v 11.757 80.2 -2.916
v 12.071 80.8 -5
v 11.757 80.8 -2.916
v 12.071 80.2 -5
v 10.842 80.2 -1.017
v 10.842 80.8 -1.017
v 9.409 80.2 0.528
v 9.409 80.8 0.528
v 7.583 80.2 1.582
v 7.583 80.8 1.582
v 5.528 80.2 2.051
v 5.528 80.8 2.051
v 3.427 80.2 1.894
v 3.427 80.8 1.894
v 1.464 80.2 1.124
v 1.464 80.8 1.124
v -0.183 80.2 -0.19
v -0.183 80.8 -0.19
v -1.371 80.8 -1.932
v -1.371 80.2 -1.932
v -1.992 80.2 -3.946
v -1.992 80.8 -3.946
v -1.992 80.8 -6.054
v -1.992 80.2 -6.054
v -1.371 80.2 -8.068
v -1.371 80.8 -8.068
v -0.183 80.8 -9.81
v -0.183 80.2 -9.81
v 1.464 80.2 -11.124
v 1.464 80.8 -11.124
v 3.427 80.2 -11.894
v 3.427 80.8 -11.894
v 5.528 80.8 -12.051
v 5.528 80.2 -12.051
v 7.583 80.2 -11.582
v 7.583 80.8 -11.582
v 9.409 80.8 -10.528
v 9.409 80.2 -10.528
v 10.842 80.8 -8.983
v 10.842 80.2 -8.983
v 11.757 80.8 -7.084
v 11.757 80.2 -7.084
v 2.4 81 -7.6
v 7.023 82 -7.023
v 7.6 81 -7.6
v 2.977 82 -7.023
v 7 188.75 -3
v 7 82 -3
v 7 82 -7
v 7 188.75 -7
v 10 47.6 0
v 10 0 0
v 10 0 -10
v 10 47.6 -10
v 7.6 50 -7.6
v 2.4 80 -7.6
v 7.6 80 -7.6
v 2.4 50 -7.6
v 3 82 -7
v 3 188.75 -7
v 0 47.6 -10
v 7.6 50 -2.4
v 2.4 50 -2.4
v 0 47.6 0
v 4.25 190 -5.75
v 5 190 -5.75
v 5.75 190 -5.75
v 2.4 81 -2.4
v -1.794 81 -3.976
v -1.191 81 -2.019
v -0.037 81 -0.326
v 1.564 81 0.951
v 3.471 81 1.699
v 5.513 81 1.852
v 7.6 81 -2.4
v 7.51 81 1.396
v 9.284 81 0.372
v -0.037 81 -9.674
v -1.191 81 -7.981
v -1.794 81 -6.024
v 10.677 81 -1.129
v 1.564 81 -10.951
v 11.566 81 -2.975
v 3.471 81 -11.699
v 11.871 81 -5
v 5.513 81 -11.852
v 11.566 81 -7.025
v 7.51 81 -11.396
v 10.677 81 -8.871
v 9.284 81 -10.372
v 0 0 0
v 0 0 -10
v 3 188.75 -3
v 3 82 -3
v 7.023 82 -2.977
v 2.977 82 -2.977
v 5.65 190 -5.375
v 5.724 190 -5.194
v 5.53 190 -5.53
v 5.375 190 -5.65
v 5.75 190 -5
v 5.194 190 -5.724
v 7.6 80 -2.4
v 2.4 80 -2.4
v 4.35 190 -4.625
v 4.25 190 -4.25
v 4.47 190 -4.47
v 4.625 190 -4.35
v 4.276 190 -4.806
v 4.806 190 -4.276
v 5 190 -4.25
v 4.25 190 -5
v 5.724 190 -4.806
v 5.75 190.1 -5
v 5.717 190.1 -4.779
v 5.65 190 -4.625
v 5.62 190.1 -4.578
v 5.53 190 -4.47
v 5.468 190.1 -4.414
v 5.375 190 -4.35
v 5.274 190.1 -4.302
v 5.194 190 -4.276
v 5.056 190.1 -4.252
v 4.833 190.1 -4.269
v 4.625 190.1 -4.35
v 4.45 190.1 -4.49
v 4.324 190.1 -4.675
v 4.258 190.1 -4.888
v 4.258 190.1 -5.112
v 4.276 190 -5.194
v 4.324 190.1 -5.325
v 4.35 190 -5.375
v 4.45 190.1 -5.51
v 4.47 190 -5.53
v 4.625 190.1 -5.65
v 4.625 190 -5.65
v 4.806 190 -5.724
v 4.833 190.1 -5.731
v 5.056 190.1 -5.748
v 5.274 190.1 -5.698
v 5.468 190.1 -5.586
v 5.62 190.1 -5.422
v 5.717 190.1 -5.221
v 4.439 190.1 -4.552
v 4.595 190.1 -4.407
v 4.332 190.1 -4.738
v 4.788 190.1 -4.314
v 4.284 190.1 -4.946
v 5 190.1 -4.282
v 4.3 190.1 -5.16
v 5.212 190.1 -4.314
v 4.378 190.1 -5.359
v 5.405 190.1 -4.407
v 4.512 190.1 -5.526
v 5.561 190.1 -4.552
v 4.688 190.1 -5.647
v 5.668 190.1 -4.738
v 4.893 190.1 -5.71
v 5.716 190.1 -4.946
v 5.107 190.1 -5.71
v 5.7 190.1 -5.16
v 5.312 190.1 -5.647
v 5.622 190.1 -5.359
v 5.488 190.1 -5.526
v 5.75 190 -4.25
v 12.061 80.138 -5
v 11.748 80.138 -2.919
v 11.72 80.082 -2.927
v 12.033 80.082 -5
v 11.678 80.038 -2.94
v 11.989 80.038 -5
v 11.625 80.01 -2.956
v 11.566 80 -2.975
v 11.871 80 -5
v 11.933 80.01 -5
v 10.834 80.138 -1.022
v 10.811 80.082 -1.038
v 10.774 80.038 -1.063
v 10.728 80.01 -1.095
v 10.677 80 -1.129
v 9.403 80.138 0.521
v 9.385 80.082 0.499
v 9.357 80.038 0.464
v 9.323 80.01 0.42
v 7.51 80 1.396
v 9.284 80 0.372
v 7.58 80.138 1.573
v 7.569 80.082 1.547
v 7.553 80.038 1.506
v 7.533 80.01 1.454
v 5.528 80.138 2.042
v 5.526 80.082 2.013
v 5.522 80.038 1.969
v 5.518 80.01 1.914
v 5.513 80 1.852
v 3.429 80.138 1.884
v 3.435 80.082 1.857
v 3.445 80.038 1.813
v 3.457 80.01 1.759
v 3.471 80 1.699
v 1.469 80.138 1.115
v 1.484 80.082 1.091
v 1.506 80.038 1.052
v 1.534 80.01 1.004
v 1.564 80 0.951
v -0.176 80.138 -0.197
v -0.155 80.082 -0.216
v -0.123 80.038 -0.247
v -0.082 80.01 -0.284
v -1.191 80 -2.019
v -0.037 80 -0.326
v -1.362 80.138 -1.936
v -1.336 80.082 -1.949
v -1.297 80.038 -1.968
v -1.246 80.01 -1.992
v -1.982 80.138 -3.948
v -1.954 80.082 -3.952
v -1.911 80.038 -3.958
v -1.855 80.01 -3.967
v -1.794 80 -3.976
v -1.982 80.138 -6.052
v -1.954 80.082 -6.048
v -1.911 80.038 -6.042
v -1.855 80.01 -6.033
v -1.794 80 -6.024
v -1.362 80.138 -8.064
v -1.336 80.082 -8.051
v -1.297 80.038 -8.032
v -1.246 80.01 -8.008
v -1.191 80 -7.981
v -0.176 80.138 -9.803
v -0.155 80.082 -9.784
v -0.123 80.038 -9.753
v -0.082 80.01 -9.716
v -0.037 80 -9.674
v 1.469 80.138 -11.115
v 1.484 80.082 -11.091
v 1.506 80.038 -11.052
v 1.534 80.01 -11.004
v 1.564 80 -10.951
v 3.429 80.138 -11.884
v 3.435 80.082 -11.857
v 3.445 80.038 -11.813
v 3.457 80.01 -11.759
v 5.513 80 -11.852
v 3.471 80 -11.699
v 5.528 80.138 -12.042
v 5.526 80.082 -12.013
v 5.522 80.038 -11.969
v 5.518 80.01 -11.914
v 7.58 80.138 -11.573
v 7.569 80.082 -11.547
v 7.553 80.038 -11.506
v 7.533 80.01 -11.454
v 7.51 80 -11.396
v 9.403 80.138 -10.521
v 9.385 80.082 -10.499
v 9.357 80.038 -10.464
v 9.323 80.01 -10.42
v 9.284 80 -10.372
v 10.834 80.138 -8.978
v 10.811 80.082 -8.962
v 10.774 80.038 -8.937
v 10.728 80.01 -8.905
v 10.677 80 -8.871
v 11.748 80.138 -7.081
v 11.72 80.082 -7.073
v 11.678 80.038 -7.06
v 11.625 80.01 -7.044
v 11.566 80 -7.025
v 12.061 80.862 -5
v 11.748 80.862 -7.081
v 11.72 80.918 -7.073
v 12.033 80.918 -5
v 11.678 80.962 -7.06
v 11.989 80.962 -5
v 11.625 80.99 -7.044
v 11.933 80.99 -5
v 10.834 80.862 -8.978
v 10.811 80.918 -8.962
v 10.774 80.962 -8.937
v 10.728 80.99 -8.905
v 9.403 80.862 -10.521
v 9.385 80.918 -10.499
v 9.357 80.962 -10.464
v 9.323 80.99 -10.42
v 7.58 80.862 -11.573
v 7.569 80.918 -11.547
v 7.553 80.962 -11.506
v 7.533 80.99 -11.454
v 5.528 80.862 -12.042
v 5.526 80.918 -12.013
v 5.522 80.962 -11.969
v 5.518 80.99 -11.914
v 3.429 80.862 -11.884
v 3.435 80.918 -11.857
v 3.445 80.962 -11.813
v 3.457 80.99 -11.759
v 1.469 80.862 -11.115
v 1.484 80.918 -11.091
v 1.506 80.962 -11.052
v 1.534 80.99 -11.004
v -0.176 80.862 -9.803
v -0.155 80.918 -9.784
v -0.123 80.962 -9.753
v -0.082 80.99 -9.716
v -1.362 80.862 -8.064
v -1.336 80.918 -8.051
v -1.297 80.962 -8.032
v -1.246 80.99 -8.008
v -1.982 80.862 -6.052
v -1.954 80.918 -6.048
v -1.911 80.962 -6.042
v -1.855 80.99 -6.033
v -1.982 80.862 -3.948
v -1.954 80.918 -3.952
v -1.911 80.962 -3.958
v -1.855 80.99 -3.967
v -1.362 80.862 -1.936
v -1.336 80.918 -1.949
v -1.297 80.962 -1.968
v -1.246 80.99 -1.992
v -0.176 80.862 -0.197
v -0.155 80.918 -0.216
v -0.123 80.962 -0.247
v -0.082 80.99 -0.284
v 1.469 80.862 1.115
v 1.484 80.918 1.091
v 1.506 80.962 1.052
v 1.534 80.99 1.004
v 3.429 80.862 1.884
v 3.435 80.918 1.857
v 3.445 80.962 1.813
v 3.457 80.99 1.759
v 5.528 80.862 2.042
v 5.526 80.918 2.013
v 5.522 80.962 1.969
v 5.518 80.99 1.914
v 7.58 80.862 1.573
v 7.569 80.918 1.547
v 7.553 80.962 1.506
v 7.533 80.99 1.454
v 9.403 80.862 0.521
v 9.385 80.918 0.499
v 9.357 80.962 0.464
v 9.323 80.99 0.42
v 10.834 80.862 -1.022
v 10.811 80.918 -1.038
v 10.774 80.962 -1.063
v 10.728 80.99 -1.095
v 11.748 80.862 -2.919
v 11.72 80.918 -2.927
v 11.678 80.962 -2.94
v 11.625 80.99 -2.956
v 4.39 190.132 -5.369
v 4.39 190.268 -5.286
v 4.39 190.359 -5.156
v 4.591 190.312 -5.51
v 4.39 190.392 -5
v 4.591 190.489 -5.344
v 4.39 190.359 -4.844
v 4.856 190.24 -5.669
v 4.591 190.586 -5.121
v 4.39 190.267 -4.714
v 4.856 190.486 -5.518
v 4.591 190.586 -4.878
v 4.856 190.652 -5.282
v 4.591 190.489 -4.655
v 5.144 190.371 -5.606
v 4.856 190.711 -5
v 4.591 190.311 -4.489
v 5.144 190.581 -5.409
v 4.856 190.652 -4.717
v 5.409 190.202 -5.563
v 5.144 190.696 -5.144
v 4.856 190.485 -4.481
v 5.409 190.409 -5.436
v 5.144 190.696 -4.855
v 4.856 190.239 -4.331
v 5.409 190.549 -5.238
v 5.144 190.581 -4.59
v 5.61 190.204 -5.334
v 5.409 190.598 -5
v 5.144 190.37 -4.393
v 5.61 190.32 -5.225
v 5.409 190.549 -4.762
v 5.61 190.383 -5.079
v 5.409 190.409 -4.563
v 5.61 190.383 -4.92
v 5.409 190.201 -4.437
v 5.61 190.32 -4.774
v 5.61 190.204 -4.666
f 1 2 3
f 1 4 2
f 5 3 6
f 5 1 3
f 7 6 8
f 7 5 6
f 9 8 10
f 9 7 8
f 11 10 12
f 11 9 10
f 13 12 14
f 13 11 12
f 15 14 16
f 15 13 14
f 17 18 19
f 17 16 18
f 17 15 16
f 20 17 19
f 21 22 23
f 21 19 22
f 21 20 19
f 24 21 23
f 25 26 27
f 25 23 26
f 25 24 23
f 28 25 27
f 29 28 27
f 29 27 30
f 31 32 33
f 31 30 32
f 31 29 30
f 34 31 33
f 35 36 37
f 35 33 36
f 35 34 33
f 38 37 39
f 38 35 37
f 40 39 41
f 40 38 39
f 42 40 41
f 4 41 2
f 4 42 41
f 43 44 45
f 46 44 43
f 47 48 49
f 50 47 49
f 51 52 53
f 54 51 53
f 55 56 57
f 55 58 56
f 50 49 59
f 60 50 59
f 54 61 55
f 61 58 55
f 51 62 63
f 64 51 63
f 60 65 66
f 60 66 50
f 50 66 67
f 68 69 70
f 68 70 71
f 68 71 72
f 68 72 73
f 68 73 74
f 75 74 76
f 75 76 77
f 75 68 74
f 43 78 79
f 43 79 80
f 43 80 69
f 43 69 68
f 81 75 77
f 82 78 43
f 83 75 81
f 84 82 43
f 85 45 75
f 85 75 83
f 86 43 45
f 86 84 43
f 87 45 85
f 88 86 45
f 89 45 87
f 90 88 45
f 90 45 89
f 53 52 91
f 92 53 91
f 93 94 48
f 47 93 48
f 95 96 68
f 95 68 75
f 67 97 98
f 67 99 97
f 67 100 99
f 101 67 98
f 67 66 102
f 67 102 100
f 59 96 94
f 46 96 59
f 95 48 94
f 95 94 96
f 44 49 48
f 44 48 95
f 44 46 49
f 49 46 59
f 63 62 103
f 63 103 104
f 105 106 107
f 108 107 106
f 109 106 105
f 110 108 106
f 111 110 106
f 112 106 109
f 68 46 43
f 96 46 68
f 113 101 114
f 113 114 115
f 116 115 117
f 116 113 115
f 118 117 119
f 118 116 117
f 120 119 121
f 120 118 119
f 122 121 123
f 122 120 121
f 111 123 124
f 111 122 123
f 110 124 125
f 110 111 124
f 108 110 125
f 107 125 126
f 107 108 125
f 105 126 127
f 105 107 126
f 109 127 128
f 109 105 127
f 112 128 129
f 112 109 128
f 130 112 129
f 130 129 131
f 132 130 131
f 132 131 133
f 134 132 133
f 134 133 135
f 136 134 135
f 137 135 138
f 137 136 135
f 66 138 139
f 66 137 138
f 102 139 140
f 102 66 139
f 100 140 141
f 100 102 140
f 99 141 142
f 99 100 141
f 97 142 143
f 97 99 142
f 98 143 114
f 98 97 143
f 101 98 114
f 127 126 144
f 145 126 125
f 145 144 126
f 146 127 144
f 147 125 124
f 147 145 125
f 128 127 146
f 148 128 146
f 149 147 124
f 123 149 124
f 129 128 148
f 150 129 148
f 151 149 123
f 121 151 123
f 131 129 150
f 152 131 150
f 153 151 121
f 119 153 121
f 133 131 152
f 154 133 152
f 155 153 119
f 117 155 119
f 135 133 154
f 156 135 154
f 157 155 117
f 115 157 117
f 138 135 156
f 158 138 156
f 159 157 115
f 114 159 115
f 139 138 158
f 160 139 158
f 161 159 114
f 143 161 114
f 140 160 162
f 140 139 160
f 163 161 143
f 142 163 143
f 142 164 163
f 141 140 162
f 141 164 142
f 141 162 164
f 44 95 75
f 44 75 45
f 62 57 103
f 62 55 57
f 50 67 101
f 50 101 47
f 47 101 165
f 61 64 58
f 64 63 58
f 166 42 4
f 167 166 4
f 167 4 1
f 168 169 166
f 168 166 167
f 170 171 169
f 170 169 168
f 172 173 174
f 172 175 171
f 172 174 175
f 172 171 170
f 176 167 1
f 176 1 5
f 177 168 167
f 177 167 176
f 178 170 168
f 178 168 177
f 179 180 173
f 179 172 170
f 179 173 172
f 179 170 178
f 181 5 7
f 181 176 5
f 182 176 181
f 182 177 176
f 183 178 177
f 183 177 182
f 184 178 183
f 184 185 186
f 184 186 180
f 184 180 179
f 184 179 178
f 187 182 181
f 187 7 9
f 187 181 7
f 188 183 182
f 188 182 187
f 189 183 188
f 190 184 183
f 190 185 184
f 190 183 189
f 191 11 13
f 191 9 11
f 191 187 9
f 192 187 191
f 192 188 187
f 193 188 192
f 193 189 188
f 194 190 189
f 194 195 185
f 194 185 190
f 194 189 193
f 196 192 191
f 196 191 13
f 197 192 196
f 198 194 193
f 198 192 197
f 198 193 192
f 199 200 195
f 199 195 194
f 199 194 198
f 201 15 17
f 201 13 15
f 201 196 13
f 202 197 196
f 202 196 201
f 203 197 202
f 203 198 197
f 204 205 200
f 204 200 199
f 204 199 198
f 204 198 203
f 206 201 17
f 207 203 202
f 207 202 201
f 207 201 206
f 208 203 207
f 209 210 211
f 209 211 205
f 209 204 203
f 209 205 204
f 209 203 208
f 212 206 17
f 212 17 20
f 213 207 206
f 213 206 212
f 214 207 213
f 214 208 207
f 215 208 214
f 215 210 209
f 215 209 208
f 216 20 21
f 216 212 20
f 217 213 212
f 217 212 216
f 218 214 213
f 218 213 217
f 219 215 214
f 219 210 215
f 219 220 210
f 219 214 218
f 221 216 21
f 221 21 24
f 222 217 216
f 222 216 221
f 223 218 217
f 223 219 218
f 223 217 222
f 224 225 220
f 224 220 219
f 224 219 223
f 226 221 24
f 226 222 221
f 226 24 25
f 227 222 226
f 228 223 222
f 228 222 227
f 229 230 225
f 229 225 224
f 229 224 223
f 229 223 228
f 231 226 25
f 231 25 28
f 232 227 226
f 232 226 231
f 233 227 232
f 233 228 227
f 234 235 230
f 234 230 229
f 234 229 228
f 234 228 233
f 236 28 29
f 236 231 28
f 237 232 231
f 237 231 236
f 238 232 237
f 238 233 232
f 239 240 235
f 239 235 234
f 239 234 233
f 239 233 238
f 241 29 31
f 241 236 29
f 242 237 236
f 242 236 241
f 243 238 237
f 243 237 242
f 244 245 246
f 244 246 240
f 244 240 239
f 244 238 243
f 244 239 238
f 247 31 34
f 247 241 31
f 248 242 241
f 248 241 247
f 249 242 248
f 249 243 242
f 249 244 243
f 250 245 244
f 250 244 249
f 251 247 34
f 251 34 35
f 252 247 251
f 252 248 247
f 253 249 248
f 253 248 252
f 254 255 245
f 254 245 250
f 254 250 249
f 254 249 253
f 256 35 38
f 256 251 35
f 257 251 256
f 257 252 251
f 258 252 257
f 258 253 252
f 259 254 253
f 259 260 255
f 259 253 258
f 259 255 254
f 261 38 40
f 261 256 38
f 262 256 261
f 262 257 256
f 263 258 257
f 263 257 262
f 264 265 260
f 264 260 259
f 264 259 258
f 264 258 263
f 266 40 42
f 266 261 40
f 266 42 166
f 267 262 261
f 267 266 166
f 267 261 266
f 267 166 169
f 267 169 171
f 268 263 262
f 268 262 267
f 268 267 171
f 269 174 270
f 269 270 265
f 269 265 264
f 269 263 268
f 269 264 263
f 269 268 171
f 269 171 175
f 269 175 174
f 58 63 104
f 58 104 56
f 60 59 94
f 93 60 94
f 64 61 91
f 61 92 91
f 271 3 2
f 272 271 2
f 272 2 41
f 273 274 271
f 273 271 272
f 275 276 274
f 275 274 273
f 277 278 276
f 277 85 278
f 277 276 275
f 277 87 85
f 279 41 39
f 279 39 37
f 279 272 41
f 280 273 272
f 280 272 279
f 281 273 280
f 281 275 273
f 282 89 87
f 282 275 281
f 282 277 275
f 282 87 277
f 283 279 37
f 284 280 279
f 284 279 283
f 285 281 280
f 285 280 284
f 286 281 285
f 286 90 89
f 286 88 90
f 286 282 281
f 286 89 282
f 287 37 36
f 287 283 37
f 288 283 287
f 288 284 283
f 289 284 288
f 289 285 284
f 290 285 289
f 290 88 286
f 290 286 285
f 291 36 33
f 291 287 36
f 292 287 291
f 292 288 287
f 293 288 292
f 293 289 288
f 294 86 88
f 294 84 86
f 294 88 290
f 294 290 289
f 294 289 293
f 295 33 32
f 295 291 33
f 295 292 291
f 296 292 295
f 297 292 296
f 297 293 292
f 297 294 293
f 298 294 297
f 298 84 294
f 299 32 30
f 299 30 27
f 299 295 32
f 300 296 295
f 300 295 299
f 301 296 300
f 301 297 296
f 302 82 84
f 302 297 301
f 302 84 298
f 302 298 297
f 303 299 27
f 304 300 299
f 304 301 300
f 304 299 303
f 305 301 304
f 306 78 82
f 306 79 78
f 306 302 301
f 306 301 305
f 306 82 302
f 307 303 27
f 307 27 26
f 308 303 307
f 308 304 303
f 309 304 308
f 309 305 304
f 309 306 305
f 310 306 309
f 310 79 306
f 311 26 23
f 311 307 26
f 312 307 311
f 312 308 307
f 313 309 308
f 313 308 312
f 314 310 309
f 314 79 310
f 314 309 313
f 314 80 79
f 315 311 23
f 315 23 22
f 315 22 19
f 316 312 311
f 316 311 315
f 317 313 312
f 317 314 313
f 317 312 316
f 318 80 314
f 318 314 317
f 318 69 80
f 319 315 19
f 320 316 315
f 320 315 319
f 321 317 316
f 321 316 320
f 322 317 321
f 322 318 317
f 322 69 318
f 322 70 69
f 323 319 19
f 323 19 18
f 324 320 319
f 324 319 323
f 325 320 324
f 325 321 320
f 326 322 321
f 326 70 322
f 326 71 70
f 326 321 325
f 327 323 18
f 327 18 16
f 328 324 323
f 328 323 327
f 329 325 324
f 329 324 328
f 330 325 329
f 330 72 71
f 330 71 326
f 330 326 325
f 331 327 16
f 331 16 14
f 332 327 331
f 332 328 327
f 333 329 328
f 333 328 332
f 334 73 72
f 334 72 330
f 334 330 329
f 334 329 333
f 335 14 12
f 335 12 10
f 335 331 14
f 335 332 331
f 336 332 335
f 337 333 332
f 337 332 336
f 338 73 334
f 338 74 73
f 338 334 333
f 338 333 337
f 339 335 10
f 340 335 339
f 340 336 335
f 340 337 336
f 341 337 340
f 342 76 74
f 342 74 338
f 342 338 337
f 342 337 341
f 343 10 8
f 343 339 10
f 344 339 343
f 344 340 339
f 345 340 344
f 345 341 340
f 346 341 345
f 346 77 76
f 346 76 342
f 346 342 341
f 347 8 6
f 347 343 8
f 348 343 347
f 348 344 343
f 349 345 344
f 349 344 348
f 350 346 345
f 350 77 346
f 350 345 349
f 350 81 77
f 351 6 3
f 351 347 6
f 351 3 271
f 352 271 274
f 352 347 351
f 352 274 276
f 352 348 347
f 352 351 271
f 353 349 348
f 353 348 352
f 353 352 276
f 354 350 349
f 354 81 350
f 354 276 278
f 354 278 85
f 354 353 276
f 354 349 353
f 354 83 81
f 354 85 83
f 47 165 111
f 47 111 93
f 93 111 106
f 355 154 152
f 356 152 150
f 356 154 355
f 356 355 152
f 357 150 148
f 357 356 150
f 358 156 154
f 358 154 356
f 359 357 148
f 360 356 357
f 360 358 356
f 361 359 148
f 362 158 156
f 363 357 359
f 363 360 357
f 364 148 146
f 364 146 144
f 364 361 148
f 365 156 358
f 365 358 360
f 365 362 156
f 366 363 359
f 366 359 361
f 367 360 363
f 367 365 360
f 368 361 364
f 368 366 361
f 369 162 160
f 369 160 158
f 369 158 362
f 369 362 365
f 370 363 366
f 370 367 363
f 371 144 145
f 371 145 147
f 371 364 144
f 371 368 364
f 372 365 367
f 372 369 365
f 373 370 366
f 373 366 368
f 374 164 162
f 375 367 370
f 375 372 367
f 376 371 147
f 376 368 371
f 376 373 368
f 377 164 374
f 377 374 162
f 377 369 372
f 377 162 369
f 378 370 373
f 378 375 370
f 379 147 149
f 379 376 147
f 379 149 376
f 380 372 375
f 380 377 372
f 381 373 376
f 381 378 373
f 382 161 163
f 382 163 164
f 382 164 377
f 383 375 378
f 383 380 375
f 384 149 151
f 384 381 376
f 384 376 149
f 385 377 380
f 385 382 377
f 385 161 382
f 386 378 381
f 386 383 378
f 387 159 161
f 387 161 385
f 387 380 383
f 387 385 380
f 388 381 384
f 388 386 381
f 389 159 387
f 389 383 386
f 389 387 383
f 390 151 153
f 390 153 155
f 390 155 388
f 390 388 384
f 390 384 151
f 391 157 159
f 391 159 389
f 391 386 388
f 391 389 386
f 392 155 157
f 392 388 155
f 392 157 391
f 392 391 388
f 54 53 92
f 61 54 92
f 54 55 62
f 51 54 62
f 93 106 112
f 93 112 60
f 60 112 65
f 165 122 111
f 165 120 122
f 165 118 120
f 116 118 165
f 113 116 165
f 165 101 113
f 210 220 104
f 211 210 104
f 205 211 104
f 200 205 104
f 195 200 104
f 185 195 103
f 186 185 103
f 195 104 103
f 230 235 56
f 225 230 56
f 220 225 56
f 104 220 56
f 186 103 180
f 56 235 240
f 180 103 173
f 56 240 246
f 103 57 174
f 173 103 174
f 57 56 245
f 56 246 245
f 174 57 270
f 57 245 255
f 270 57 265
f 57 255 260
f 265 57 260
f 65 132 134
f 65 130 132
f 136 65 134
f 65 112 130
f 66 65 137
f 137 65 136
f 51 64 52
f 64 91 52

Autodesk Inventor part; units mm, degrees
ref_plane "YZ Plane" through (0, 0, 0) normal (1, 0, 0) x (0, 1, 0)
ref_plane "XZ Plane" through (0, 0, 0) normal (0, 1, 0) x (-1, 0, 0)
ref_plane "XY Plane" through (0, 0, 0) normal (0, 0, 1) x (1, 0, 0)
sketch "草圖1" plane through (0, 0, 0) normal (0, 1, 0) x (-1, 0, 0)
  line L0 (0, 0) -> (-10, 0)
  line L1 (-10, 0) -> (-10, -10)
  line L2 (-10, -10) -> (0, -10)
  line L3 (0, -10) -> (0, 0)
  dimension "d0" = 10
  dimension "d1" = 10
extrude "擠出1" add sketch "草圖1" along normal blind 50
chamfer "倒角1" distance 2.4 angle 45 4 edges at (5, 50, 0) (10, 50, -5) (5, 50, -10) (0, 50, -5)
sketch "草圖2" plane through (0, 50, 0) normal (0, 1, 0) x (1, 0, 0)
  line L0 (2.4, 2.4) -> (2.4, 7.6) projected
  line L1 (7.6, 2.4) -> (2.4, 2.4) projected
  line L2 (2.4, 7.6) -> (7.6, 7.6)
  line L3 (7.6, 7.6) -> (7.6, 2.4)
  line L4 (7.6, 2.4) -> (2.4, 2.4)
  line L5 (2.4, 2.4) -> (2.4, 7.6)
  point P0 (0, 0)
extrude "擠出2" add sketch "草圖2" along normal blind 30
sketch "草圖3" plane through (0, 80, 0) normal (0, 1, 0) x (1, 0, 0)
  line L0 (2.4, 7.6) -> (7.6, 7.6)
  line L1 (7.6, 7.6) -> (7.6, 2.4)
  line L2 (7.6, 2.4) -> (2.4, 2.4)
  line L3 (2.4, 2.4) -> (2.4, 7.6)
  circle A0 centre (5, 5) radius 7.0711
  line L4 (7, 7) -> (3, 7)
  line L5 (3, 7) -> (3, 3)
  line L6 (3, 3) -> (7, 3)
  line L7 (7, 3) -> (7, 7)
  line L8 (7, 7) -> (3, 3) construction
  line L9 (3, 7) -> (7, 3) construction
  point P0 (0, 0)
  point P1 (10, 10)
  dimension "d31" = 4
  dimension "d32" = 4
extrude "擠出3" add sketch "草圖3" along normal blind 110 contours L7 L6 L5 L4
extrude "擠出5" add sketch "草圖3" along normal blind 1 contours A0
fillet "圓角1" radius 0.2 2 edges at (-2.0711, 80, -5) (-2.0711, 81, -5)
chamfer "倒角7" distance 1.25 angle 45 4 edges at (5, 190, -7) (7, 190, -5) (5, 190, -3) (3, 190, -5)
extrude "擠出6" add sketch "草圖3" along normal blind 2 contours L0 L1 L2 L3 | L7 L6 L5 L4
chamfer "倒角8" distance 1 angle 30 1 edges at (5, 82, -7.6) measured on face at (5.8667, 81.3333, -7.6)
chamfer "倒角9" distance 1 angle 30 1 edges at (2.4, 82, -4.7116) measured on face at (2.4, 81.3333, -5.6744)
chamfer "倒角10" distance 1 angle 30 1 edges at (5.2884, 82, -2.4) measured on face at (4.3256, 81.3333, -2.4)
chamfer "倒角11" distance 1 angle 30 1 edges at (7.6, 82, -5) measured on face at (7.6, 81.3333, -5.6744)
sketch "草圖7" plane through (0, 190, 0) normal (0, 1, 0) x (1, 0, 0)
  line L0 (5.75, 5.75) -> (5.75, 4.25) projected
  circle A0 centre (5, 5) radius 0.725
  line L1 (5.75, 5) -> (4.25, 5)
  point P0 (0, 0)
  point P1 (5.725, 5)
  point P2 (4.275, 5)
  dimension "d54" = 1.45
revolve "迴轉2" add sketch "草圖7" angle 180 about axis through (5.75, 190, -5) along (-1, 0, 0) picked at (4.7654, 4.9422) contours A0 L1
sketch "草圖9" plane through (0, 190, 0) normal (0, 1, 0) x (1, 0, 0)
  circle A0 centre (5, 5) radius 0.725
  circle A1 centre (5, 5) radius 0.75
  point P0 (0, 0)
extrude "擠出8" add sketch "草圖9" along normal blind 0.1 contours A0 | A1
properties part number "尖尖"
